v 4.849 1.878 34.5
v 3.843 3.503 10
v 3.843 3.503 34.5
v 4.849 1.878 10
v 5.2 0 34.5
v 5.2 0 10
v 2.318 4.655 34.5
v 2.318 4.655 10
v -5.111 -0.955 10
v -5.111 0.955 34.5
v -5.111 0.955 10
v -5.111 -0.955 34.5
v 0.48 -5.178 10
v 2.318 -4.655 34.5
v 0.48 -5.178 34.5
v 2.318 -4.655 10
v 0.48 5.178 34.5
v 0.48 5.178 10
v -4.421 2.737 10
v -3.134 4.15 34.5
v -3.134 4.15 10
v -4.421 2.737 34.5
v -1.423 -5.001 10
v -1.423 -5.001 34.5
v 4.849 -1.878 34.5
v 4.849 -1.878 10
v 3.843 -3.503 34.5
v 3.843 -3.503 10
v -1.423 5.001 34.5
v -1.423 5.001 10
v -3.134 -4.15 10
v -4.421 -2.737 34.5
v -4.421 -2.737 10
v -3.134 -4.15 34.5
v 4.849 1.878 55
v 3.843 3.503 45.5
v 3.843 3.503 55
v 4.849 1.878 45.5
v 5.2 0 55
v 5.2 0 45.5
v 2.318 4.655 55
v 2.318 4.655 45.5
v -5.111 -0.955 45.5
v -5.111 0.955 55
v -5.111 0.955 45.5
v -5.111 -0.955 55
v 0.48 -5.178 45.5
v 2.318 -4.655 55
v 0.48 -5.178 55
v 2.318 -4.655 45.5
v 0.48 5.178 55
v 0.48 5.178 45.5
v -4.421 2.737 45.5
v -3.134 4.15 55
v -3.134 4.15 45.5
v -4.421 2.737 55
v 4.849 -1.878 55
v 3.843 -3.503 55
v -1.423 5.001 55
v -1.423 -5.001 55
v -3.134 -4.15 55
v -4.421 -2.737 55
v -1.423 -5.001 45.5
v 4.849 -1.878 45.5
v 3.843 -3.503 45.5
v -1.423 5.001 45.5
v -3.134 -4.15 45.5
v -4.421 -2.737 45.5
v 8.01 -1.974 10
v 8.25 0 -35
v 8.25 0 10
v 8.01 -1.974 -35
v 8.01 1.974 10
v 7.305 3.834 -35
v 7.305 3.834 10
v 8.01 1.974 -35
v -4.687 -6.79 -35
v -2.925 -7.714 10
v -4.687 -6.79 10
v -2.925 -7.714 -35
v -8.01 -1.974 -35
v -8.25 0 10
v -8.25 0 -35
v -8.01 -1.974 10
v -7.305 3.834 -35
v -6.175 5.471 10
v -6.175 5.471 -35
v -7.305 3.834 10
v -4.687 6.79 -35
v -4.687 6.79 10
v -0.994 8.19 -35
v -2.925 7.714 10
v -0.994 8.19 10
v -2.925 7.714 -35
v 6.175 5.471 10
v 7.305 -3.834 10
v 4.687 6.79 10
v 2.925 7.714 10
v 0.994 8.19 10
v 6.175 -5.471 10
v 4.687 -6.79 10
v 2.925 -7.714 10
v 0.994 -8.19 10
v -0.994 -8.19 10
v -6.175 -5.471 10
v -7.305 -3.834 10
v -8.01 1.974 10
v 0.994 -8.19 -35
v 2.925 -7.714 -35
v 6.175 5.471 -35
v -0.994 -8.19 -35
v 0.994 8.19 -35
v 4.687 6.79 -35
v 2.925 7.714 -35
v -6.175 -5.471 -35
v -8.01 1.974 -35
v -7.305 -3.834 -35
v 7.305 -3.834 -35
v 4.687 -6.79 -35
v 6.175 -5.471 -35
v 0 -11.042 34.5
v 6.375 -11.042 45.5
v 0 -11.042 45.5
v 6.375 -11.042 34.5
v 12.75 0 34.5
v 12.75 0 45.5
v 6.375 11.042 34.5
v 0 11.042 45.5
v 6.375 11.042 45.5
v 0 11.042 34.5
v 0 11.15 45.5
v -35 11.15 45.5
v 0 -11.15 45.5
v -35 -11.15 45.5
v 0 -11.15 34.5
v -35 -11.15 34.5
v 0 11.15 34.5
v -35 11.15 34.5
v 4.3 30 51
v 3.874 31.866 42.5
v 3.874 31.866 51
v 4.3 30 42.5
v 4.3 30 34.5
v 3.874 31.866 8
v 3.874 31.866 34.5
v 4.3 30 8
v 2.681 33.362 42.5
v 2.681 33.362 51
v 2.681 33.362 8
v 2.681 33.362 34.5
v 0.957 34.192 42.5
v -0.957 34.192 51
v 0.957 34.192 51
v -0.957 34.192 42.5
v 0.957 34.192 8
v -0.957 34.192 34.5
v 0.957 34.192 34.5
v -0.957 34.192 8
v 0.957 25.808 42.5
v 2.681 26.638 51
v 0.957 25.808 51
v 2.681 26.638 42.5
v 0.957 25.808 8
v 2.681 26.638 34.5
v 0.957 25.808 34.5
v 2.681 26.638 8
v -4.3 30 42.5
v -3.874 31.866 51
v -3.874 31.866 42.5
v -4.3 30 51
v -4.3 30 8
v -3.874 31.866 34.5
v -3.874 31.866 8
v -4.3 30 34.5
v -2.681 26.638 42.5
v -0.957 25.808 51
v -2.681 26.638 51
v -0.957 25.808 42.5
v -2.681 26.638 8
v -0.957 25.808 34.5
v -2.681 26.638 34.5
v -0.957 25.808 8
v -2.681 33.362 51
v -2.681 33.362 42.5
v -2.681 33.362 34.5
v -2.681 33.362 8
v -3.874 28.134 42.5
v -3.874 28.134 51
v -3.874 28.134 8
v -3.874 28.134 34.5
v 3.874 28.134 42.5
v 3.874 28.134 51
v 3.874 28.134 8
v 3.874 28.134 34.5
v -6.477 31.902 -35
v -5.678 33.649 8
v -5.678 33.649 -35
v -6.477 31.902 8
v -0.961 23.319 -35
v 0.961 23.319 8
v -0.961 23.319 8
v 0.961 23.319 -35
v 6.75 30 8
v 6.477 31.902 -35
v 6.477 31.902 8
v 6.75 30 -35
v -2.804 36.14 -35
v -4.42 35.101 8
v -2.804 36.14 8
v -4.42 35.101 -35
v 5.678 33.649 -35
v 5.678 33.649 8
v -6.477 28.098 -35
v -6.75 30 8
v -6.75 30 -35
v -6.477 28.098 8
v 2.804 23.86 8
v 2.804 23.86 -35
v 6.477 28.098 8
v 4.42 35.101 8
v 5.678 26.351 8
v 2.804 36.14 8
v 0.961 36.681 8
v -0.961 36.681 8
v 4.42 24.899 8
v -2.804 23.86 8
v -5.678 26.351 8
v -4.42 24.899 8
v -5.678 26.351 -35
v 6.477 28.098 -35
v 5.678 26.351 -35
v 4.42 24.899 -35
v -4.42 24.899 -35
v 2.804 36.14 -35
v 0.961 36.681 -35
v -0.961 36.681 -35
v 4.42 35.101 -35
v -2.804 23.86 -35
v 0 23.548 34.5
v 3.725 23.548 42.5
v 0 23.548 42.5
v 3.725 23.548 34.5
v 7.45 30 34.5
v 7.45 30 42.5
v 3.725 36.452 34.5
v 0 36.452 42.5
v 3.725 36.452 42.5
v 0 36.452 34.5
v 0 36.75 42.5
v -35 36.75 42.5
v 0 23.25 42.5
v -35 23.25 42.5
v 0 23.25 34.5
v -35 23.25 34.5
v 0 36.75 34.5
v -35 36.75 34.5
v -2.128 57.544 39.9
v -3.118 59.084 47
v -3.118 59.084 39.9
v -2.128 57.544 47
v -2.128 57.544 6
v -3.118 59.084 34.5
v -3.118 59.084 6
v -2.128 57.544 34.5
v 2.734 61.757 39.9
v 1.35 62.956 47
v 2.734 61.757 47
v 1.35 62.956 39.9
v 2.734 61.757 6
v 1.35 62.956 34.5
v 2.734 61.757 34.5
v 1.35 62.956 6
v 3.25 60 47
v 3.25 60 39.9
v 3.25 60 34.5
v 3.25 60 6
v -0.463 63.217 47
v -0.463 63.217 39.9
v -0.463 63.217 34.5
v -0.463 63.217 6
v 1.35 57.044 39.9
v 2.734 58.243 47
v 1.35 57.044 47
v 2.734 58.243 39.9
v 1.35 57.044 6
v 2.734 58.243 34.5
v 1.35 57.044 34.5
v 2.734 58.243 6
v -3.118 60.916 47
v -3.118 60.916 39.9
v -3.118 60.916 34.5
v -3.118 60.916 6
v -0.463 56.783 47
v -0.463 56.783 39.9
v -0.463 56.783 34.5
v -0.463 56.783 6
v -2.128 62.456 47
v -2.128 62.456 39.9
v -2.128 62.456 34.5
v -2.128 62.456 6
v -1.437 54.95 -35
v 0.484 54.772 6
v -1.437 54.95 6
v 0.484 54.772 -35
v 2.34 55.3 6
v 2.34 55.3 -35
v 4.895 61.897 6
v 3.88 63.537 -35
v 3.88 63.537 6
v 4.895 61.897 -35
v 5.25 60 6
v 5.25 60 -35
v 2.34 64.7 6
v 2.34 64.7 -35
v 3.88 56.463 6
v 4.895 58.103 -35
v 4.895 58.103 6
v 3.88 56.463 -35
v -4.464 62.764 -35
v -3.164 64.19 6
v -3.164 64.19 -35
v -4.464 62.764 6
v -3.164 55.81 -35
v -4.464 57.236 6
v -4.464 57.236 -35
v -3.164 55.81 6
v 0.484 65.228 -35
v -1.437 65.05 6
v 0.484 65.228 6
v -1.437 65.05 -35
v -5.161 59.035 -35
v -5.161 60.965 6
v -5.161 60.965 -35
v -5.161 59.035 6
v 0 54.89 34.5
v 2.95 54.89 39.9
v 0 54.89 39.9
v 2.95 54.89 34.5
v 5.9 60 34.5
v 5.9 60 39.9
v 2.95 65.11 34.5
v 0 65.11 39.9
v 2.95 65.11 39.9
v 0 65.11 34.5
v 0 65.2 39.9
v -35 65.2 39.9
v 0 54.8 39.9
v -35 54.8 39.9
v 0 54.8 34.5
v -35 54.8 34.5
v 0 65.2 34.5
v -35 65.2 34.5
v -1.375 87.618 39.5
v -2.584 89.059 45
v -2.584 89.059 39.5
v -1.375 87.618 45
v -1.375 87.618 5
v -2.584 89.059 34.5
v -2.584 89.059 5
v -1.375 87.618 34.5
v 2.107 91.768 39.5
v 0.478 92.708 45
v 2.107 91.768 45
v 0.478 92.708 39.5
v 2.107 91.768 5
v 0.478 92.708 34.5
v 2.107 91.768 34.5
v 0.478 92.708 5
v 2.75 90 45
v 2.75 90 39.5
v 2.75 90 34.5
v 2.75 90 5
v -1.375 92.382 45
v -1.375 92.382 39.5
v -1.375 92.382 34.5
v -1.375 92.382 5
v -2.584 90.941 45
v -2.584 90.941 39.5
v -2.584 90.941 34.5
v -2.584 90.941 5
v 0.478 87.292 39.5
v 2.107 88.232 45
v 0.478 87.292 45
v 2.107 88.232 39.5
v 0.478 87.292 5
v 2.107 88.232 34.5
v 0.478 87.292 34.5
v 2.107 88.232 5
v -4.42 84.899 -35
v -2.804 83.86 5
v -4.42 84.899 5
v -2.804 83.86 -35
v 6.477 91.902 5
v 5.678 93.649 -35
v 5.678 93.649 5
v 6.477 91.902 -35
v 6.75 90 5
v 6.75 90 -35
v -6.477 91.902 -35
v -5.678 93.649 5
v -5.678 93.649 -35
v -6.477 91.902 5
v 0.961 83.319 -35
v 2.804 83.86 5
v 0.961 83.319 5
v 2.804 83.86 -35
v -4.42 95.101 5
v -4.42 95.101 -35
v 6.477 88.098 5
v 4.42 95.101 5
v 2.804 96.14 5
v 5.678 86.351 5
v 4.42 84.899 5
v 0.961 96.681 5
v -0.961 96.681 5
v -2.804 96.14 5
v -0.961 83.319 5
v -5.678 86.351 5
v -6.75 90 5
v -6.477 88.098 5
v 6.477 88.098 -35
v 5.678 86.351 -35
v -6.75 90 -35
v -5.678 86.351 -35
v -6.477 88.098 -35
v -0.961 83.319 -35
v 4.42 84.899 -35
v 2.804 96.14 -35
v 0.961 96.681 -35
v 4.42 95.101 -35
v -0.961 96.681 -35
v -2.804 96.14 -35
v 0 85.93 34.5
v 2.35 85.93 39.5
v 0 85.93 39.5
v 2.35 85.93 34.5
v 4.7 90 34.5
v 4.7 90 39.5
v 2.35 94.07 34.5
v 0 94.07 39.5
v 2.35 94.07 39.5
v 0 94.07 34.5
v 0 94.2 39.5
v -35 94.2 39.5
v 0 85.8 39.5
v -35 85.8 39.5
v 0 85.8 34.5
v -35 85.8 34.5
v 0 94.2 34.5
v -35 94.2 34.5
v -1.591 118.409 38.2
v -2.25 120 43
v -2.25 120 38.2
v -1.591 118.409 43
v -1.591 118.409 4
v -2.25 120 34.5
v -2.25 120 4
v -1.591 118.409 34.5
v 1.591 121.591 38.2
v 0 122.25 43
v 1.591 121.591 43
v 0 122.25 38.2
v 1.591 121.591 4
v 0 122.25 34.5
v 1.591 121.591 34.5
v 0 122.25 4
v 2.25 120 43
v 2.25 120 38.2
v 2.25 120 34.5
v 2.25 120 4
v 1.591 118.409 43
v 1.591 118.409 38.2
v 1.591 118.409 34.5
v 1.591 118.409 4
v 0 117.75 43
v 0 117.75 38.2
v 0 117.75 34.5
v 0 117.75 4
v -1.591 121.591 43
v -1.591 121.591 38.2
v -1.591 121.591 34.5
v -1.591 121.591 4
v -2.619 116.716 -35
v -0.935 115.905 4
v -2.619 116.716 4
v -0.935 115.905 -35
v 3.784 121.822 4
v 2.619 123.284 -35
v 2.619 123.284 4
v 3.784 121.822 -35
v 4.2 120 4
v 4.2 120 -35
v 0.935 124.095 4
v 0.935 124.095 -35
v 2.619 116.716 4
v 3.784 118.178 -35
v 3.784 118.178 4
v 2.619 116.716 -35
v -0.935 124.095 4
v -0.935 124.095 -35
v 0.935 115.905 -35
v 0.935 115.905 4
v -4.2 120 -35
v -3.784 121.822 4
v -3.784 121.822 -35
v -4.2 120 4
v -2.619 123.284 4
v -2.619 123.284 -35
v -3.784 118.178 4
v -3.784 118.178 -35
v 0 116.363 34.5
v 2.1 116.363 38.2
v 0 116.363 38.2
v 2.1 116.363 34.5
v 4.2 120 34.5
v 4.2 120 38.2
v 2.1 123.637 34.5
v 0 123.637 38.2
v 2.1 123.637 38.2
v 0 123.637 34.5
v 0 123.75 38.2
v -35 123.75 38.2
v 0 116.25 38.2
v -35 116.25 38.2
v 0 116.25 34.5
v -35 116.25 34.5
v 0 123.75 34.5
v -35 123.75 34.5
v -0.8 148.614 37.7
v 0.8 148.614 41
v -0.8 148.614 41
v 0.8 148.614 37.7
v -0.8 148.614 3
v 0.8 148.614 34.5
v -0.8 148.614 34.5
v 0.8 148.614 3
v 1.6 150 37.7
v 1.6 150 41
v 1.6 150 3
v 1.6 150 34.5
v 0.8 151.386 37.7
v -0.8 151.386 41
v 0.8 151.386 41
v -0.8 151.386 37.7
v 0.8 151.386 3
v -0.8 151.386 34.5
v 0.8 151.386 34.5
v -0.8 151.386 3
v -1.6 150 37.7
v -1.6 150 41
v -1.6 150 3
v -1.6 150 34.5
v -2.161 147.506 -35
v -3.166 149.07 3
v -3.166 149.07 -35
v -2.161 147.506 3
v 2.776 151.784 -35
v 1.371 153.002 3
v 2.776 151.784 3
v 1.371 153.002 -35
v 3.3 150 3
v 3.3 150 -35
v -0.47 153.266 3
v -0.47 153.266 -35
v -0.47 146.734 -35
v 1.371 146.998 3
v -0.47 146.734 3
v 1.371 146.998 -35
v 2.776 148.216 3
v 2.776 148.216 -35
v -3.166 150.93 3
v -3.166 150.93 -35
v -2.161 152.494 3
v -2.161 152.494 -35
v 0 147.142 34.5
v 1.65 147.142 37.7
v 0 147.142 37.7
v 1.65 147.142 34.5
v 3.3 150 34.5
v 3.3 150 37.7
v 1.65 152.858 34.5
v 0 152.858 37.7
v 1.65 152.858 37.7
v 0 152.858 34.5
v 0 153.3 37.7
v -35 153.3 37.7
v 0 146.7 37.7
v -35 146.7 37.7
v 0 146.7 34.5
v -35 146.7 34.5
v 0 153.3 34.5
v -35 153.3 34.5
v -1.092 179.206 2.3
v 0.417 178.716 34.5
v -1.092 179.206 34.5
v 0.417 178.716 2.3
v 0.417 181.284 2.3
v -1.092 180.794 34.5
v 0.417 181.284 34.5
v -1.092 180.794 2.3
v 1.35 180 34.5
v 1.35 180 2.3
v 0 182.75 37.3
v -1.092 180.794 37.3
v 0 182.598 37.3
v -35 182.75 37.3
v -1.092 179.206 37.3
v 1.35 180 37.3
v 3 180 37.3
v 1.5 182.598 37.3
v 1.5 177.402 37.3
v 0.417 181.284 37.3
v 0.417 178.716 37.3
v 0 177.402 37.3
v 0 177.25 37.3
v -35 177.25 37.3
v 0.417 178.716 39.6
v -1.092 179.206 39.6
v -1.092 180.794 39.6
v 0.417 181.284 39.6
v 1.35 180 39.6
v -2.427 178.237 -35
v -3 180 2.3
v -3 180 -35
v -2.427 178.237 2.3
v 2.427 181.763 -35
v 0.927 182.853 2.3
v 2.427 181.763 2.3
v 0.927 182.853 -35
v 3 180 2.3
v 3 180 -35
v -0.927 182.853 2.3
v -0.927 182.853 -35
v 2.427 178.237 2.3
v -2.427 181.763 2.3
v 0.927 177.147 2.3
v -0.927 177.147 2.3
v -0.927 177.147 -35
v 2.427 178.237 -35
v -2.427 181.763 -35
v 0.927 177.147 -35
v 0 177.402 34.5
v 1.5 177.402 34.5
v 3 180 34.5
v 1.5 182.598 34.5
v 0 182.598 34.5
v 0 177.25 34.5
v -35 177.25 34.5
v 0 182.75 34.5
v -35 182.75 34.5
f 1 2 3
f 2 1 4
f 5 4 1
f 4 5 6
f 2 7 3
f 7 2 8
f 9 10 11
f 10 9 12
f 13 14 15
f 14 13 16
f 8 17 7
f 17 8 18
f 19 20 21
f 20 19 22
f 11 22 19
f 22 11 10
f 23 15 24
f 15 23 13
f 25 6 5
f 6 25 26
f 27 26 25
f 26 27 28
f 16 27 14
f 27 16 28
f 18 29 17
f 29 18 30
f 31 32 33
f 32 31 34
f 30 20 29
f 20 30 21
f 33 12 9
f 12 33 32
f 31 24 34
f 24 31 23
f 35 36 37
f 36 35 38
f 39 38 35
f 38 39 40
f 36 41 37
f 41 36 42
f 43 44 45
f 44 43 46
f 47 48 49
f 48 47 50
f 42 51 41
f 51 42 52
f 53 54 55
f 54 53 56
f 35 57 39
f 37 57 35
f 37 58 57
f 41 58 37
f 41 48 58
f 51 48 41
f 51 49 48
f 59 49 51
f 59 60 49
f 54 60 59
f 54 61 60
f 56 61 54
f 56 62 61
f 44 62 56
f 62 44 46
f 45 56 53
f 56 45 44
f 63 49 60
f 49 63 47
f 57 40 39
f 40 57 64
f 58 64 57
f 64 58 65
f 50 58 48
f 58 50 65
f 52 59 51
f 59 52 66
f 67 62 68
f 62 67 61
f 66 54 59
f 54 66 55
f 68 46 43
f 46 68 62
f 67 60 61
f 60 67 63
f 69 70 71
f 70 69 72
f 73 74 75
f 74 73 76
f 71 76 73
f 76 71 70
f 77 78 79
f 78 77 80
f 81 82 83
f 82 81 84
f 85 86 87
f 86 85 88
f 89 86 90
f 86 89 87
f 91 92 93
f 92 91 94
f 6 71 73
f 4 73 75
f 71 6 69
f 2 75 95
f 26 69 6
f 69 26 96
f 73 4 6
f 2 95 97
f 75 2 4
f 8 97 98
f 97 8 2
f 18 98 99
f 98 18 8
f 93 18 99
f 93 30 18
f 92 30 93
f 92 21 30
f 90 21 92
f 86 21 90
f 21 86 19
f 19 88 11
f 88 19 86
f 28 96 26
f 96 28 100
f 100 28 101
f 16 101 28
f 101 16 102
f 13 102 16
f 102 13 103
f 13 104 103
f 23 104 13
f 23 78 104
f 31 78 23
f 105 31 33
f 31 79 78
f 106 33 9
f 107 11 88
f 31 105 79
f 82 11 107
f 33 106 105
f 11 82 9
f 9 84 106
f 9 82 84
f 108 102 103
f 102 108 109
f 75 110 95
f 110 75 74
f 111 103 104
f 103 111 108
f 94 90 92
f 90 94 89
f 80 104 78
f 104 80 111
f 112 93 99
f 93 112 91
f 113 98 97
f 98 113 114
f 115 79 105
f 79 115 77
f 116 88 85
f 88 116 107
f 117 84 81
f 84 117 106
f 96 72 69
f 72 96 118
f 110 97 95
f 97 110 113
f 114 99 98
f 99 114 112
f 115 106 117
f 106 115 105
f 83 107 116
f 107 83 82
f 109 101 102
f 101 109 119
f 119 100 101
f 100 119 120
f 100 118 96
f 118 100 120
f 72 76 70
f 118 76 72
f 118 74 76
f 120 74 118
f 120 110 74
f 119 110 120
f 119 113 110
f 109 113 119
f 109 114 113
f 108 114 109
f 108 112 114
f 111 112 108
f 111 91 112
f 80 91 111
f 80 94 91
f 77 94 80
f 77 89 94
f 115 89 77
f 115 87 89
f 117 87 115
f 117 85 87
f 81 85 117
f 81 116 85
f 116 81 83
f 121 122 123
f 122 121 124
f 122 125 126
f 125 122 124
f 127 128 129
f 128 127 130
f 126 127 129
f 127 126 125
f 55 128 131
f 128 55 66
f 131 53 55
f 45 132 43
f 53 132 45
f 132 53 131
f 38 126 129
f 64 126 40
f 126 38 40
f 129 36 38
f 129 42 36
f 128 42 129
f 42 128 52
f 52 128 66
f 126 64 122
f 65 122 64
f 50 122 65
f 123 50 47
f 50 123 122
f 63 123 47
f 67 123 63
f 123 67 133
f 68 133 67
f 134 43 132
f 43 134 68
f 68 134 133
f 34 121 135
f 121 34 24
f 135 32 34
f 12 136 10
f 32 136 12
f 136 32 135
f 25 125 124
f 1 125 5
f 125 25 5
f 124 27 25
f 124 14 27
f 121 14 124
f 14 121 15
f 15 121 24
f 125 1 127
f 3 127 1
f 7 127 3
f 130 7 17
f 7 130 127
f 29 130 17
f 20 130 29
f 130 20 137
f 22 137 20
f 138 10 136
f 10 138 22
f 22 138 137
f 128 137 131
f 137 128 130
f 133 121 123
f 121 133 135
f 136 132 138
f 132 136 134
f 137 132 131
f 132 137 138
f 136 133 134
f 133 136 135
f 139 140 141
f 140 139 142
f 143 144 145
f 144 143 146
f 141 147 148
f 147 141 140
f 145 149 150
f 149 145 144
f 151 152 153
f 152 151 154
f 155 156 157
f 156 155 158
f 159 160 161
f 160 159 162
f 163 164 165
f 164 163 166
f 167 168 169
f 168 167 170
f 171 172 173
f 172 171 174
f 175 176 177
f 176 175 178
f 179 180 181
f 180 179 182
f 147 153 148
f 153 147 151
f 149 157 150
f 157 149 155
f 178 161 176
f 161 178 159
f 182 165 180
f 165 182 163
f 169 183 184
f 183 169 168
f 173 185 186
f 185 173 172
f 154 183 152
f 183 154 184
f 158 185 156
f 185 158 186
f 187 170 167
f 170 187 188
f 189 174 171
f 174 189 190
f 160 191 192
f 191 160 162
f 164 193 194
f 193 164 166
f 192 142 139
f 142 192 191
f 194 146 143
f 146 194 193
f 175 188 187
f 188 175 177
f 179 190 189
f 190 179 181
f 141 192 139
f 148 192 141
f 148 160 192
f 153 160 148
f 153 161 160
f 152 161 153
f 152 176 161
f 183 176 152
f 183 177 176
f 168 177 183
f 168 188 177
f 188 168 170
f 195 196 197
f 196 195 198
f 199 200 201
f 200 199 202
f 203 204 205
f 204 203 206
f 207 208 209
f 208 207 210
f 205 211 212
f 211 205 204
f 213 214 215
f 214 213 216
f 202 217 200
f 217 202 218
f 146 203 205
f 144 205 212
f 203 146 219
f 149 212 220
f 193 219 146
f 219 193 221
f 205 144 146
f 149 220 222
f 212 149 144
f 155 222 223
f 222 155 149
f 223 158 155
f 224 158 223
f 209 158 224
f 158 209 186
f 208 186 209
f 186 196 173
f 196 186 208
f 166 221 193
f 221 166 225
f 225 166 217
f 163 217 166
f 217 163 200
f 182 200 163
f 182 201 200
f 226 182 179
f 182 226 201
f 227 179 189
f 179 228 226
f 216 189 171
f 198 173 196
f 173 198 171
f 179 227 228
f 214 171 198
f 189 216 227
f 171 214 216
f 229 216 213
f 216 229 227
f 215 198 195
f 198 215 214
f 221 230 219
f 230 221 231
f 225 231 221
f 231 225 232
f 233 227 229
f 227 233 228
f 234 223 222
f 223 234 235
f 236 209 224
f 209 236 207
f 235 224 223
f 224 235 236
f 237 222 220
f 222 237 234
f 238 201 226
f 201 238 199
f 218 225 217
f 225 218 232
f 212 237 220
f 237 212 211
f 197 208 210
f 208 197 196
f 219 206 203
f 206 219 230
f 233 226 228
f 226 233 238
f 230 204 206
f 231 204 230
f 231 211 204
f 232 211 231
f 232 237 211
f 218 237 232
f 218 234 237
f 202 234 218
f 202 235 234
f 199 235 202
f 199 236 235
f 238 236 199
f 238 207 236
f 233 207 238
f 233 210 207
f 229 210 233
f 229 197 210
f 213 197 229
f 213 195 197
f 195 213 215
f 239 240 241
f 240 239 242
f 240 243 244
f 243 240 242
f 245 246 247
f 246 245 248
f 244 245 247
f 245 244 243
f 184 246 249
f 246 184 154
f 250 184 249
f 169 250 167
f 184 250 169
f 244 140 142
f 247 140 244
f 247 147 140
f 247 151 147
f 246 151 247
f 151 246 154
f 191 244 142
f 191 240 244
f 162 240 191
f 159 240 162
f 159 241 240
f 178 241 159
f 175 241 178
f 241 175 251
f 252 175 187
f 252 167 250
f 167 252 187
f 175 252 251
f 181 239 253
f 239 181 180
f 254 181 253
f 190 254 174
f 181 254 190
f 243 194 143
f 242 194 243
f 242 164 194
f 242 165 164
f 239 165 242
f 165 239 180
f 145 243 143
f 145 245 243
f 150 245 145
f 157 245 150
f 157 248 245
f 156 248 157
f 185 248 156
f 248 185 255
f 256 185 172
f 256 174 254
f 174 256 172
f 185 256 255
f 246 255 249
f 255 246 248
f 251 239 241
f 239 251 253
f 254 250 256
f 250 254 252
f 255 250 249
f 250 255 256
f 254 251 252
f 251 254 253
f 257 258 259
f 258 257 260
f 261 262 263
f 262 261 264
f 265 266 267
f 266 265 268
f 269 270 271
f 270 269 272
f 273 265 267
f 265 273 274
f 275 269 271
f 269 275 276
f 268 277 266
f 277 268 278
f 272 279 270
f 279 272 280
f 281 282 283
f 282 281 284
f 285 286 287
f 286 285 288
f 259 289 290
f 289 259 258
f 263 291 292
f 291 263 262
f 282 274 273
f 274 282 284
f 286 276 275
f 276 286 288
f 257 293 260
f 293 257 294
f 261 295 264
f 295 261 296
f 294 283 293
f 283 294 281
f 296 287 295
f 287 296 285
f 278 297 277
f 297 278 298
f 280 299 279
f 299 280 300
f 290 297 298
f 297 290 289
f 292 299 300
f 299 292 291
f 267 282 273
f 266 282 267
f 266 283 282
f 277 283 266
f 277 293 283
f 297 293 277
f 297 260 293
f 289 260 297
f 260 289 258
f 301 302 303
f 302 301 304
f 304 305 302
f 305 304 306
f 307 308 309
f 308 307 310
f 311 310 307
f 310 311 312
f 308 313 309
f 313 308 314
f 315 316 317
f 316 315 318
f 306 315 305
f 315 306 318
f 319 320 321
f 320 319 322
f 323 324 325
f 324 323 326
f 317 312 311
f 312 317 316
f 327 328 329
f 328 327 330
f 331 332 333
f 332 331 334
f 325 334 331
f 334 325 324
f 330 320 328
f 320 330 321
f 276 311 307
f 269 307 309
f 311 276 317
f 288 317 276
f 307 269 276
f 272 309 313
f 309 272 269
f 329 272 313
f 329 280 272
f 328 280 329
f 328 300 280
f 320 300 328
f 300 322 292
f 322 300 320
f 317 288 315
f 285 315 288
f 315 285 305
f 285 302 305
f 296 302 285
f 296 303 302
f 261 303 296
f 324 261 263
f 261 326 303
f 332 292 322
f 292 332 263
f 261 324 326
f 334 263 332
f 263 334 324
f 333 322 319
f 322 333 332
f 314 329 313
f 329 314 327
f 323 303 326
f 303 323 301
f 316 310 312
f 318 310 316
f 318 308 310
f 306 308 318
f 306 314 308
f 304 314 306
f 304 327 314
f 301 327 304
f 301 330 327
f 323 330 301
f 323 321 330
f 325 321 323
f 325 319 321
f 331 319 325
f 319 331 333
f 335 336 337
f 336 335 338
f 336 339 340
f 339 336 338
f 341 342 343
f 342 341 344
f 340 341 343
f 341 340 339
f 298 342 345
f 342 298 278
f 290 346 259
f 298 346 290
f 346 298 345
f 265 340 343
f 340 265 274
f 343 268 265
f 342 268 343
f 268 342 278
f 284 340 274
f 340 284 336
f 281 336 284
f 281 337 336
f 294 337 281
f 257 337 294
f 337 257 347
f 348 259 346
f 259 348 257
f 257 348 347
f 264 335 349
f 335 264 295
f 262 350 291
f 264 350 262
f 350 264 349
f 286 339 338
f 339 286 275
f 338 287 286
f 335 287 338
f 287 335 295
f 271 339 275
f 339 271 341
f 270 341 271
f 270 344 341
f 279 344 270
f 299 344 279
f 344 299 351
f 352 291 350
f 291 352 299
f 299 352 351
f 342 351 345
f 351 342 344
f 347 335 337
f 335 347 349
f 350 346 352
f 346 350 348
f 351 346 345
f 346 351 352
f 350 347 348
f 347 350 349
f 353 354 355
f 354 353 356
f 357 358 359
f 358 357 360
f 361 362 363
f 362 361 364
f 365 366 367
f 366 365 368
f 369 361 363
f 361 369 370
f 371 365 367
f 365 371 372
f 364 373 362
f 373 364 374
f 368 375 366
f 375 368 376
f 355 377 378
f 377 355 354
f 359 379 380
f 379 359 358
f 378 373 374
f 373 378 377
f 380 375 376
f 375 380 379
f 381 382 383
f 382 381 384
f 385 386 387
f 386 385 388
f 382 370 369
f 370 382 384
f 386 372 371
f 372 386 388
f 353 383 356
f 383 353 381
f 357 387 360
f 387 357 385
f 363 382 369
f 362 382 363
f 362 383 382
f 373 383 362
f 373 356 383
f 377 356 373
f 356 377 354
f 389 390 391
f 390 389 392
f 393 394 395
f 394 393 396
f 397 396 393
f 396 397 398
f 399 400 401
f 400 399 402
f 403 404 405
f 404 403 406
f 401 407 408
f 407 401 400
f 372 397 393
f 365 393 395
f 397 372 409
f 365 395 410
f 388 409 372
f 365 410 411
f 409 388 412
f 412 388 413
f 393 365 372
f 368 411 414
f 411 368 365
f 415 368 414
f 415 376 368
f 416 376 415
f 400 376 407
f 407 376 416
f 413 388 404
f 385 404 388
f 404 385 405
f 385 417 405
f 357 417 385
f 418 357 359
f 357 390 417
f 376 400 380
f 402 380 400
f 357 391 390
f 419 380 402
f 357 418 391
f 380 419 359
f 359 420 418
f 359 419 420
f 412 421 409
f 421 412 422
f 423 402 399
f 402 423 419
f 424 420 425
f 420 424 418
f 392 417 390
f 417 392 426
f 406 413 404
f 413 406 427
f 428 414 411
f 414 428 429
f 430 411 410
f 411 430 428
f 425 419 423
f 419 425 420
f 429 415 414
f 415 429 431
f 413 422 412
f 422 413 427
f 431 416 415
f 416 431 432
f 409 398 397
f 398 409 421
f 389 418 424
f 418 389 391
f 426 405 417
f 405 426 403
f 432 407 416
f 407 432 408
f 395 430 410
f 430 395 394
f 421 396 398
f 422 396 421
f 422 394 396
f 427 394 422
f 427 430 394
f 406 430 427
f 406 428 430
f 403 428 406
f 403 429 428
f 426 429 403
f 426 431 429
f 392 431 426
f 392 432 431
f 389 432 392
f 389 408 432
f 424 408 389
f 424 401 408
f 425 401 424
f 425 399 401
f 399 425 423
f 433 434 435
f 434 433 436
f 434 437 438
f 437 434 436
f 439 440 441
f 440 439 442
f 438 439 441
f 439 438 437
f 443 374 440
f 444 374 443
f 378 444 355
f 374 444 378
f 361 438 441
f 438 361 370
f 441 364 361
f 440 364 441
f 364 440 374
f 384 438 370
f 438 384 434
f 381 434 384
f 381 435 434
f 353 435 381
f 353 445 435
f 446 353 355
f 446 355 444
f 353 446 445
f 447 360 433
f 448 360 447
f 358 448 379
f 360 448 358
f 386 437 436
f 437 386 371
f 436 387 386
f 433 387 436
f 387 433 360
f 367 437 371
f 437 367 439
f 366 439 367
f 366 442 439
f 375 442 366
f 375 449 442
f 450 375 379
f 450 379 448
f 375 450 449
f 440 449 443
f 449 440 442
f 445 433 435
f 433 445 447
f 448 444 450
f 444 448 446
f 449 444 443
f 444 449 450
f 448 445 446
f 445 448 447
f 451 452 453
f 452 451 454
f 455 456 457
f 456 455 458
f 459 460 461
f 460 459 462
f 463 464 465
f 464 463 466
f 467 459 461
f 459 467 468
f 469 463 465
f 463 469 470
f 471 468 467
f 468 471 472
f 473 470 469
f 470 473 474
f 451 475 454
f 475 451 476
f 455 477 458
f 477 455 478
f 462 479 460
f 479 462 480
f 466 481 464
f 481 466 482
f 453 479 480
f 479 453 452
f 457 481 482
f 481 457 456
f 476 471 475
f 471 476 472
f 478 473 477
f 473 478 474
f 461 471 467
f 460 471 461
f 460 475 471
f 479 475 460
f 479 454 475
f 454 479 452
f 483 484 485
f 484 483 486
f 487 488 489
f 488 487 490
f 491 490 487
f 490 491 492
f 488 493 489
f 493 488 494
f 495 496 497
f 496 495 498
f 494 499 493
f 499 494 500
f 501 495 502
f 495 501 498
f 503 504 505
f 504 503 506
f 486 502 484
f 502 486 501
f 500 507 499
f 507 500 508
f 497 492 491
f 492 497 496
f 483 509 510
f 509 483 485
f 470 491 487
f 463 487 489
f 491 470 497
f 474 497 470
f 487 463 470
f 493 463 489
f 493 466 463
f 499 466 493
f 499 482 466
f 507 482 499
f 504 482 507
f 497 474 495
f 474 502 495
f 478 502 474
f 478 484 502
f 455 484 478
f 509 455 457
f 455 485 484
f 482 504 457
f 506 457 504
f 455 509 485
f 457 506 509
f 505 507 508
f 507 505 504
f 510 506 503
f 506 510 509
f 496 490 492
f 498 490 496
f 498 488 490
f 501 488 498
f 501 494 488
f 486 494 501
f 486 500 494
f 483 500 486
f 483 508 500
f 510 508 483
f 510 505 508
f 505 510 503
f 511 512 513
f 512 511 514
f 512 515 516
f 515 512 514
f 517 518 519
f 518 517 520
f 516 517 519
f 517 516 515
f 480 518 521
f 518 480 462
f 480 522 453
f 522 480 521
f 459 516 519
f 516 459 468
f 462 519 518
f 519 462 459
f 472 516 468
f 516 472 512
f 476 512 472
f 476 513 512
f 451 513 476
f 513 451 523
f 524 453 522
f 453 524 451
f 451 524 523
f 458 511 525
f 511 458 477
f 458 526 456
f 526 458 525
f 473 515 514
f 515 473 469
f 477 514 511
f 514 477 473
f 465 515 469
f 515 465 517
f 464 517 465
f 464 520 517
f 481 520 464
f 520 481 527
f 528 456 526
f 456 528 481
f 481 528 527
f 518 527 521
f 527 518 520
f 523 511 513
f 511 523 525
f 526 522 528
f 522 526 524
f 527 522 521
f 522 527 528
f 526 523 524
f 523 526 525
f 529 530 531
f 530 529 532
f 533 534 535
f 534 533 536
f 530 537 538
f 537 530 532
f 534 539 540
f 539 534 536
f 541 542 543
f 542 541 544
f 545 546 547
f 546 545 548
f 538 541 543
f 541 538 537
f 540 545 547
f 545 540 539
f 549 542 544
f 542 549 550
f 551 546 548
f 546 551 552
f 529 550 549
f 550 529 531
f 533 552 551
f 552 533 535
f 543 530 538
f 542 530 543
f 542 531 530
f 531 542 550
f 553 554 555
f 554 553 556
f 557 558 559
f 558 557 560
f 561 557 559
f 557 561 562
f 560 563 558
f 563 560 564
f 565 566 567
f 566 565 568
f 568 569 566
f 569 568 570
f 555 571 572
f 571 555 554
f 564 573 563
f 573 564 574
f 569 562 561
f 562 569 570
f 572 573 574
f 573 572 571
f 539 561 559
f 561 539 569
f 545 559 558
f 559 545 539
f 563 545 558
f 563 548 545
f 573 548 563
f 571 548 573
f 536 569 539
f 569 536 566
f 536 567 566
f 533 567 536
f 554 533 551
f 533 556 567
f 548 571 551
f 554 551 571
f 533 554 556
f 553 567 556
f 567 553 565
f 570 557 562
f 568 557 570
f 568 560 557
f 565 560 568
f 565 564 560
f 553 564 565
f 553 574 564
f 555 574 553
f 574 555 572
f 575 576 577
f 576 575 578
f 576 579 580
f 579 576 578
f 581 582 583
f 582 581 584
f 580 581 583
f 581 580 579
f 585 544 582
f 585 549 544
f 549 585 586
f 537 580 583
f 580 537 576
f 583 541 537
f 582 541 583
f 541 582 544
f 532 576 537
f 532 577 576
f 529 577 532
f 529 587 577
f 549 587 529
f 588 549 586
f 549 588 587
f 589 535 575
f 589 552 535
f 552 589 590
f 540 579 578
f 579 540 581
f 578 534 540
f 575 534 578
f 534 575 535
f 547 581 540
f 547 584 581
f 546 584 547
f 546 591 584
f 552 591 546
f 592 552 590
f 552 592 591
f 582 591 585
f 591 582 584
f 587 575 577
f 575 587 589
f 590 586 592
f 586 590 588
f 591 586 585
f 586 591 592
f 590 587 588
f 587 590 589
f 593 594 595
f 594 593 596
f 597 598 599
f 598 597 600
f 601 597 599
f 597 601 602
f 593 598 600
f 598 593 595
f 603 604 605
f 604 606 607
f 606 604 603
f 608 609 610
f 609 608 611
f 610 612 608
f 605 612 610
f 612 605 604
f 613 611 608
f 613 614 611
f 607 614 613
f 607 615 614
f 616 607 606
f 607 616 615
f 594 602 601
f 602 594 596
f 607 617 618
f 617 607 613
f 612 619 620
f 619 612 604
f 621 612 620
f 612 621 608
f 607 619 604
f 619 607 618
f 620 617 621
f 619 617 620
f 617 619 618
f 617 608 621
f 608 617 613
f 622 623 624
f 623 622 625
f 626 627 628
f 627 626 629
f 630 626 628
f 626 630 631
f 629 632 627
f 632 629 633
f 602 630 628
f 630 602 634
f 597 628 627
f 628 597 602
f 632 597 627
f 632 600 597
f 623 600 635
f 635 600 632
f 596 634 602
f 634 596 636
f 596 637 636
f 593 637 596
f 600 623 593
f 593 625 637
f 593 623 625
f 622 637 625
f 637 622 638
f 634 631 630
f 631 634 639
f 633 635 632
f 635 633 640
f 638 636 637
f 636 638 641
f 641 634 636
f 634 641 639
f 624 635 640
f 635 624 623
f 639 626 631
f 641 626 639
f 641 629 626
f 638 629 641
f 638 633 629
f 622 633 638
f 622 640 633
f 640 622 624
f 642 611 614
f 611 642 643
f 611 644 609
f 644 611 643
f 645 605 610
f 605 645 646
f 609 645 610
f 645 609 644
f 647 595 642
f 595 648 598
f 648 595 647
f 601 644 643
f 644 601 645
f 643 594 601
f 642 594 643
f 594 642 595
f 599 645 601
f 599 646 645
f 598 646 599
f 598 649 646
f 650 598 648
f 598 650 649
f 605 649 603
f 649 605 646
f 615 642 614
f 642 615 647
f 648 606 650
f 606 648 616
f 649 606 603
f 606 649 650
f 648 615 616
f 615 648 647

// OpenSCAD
// file: ../../parameters.scad
maximum_printable_size = 150;

global_clearance = 0.5;

// screw length step - minimum difference in length between two types of screws
basic_screw_length = 5;

//Screw diameter and nut for M10 [mm]
M10_screw_diameter = 10.4;
M10_head_height = 10;
M10_head_diameter = 16+0.5;
M10_nut_height = 10.5;
M10_nut_diameter = 25.5;
M10_nut_pocket = 22.3;

//Screw diameter for M8 [mm]
M8_screw_diameter = 8.6;
M8_head_height = 8;
M8_head_diameter = 13.5;
M8_nut_height = 7.5;
M8_square_nut_thin_height = 4.5;
M8_nut_diameter = 14.4 + 0.5;
M8_nut_pocket = 13 + 0.5;
M8_washer_diameter = 16;
M8_washer_thickness = 1.5;


//Screw diameter and nut for M6 [mm]
M6_screw_diameter=6.5;
M6_head_diameter = 10+0.5;
M6_head_height = 6;
M6_nut_height = 4.9;
M6_nut_diameter = 11.8;
M6_nut_pocket = 10.4;
M6_square_nut_height = 3;
M6_square_nut_diameter = 10;

//Screw diameter and nut for M5 [mm]
M5_screw_diameter=5.5;
M5_head_height = 5;
M5_head_diameter = 13+0.5;
M5_nut_height = 4.5;
M5_nut_diameter = 9.4;
M5_nut_pocket = 8.4;

//Screw diameter and nut for M4 [mm]
M4_screw_diameter=4.5;
M4_screw_head_height = 4;
M4_nut_height = 3.2;
M4_nut_diameter = 8.4;
M4_nut_pocket = 7.5;

//Screw diameter and nut for M3 [mm]
M3_screw_diameter = 3.2;
M3_nut_height = 2.7;
M3_nut_diameter = 6.6;
M3_nut_pocket = 5.6;
M3_screw_head_height = 3;

//Screw diameter and nut for M2,5 [mm]
M2_5_screw_diameter = 2.7;
M2_5_nut_height = 2.3;
M2_5_nut_diameter = 6;
M2_5_nut_pocket = 5.5;

// kulove lozisko

bearing_efsm_08_h = 33+1;
bearing_efsm_08_m = 22;
bearing_efsm_08_db = 18;
bearing_efsm_08_ag = 10.5;
bearing_efsm_08_n = M4_screw_diameter;
bearing_efsm_08_a1 = 5.5;
bearing_efsm_08_d = 8.25;
bearing_efsm_08_B = 8; // ball height

bearing_efsm_10_h = 38+1;
bearing_efsm_10_m = 26;
bearing_efsm_10_db = 21.9;
bearing_efsm_10_ag = 12+0.2;
bearing_efsm_10_n = M5_screw_diameter;
bearing_efsm_10_a1 = 6.5;
bearing_efsm_10_d = 10.25;


bearing_efsm_12_width = 40+1;
bearing_efsm_12_h = bearing_efsm_12_width;
bearing_efsm_12_boltd = 28/2; // polovina vzdalenosti mezi srouby
bearing_efsm_12_m = bearing_efsm_12_boltd*2;
bearing_efsm_12_db = 25;
bearing_efsm_12_ag = 13;
bearing_efsm_12_a1 = 7;
bearing_efsm_12_n = M5_screw_diameter;
bearing_efsm_12_d = 12.15;
bearing_efsm_12_B = 10; // ball height
bearing_efsm_space = 1;

bearing_efsm_17_width = 54+1;
bearing_efsm_17_h = bearing_efsm_17_width;
bearing_efsm_17_boltd = 38/2; // polovina vzdalenosti mezi srouby
bearing_efsm_17_m = bearing_efsm_17_boltd*2;
bearing_efsm_17_db = 35;
bearing_efsm_17_ag = 18;
bearing_efsm_17_n = M6_screw_diameter;
bearing_efsm_17_a1 = 10;
bearing_efsm_17_B = 17; // ball height

//limcove lozisko
bearing_EFOM_10_L=26; //celkova sirka zakladny
bearing_EFOM_10_d1=10.3;//diametr otvoru real=10 mm
bearing_EFOM_10_dB=22;//diametr vystupku pro ulozeni lozika
bearing_EFOM_10_H=52;//celková delka zakladny
bearing_EFOM_10_J=36;// hole pitch
bearing_EFOM_10_A1=6.5;//vyska pouzdra
bearing_EFOM_10_Ag=12;//celkova vyska
bearing_EFOM_10_N1=5;//sirka otvoru pro sroub
bearing_EFOM_10_N2=8;//delka otvoru pro sroub
bearing_EFOM_10_m=36;//roztec der pro sroub
bearing_EFOM_10_h=9;//vyska lozika

608_bearing_outer_diameter = 22.3;
608_bearing_inner_diameter = 16;
608_bearing_thickness = 7.1;


// 20 KG servo parameters

servo_20kg_axis_offset = 9.375; // jak je osa mimo stredu
servo_20kg_body_x = 42;
servo_20kg_body_y = 21;
servo_20kg_body_z = 40;
servo_20kg_thread_x = 49/2;
servo_20kg_thread_y = 10/2;
servo_20kg_body_below = 10; // jak hluboko je tělo serva pod drzaky na srouby
servo_20kg_below = 25.8; // jak hluboko je páka serva pod drzaky na srouby

servo_20kg_bolt_d = 2.5+0.3;
servo_20kg_nut_d = 5+0.3;


//strain gauge
strain_gauge_width = 12.7;
strain_gauge_length = 75.1;
strain_gauge_screw_distance = 10;

//ALU profile
ALU_profile_width = 30.3;
ALU_profile_holder_wall_thickness = 3;
ALU_profile_groove_width = 8;

//pillow block bearing
//https://www.igus.eu/product/372
//Part no. KSTM-08
KSTM08_screws_distance = 33;         //m
KSTM08_screws_holes_diameter = 4.5;  //d2
KSTM08_flange_thickness = 6;         //h3
KSTM08_case_width = 9;               //C1
KSTM08_case_length = 47;             //a
KSTM08_ball_width = 12;              //B

//ložiska pro malý rotor
bearing_outer_diameter = 10.2;    // Rozměr B1 v nákresu s přídavkem na toleranci otvoru
bearing_thickness = 4;        // Rozměr B2 v nákresu
//bearing_shaft_length = 19.5;    // Rozměr B3 v nákresu, Originalni hodnota 19.5
bearing_shaft_length = 20;    // Rozměr B3 v nákresu
// main file
include <../../parameters.scad>

module bolt(size = 4, length = 35, pocket = true, pocket_size = 35, washer = false,
            square_nut = false)
{
    bolts = [//size | bolt d | head h | head d | nut h | nut d | nut pckt 
             [10    ,  10.4  , 10     , 16.5   , 10.5  , 25.5  , 22.3],
             [8     ,  8.6   , 8      , 13.5   , 7.5   , 14.9  , 13.5],
             [6     ,  6.5   , 6      , 10.5   , 4.9   , 11.8  , 10.4],
             [5     ,  5.5   , 5      , 13.5   , 4.5   , 9.4   , 8.4 ],
             [4     ,  4.5   , 4      , 8.4    , 3.2   , 8.4   , 7.5 ],
             [3     ,  3.2   , 3      , 6.6    , 2.7   , 6.6   , 6.6 ],
             [2.5   ,  2.7   , 2.3    , 6      , 2.3   , 6     , 5.5 ],
            ];
    bolt_diameter = bolts[search(size, bolts)[0]][1];
    head_height   = bolts[search(size, bolts)[0]][2];
    head_diameter = bolts[search(size, bolts)[0]][3];
    nut_height    = bolts[search(size, bolts)[0]][4];
    nut_diameter  = bolts[search(size, bolts)[0]][5];
    nut_pocket    = bolts[search(size, bolts)[0]][6];

    // bolt
    color("gray", 1)
        cylinder(h = length + head_height, d = bolt_diameter);
    // bolt pocket
    translate([0, 0, length + head_height])
        cylinder(h = head_height, d = bolt_diameter);
    // head
    color("gray")
        cylinder(h = head_height, d = head_diameter);
    // head pocket
    if (pocket == true)
    translate([0, 0, -length])
        cylinder(h = length, d = head_diameter);
    // nut TODO square nut option
    if (square_nut == false)
        color("gray")
            translate([0, 0, length - global_clearance])
                cylinder(h = nut_height + global_clearance, d = nut_diameter, $fn=6);
    // nut pocket TODO square nut option
    if (pocket == true)
        translate([-pocket_size, -nut_pocket/2, length - global_clearance])
            cube([pocket_size, nut_pocket, nut_height + global_clearance]);
    // TODO washer
}

// Example
bolt(10);
translate([0, 30, 0])
    bolt(8);
translate([0, 60, 0])
    bolt(6);
translate([0, 90, 0])
    bolt(5);
translate([0, 120, 0])
    bolt(4);
translate([0, 150, 0])
    bolt(3);
translate([0, 180, 0])
    bolt(2.5);
